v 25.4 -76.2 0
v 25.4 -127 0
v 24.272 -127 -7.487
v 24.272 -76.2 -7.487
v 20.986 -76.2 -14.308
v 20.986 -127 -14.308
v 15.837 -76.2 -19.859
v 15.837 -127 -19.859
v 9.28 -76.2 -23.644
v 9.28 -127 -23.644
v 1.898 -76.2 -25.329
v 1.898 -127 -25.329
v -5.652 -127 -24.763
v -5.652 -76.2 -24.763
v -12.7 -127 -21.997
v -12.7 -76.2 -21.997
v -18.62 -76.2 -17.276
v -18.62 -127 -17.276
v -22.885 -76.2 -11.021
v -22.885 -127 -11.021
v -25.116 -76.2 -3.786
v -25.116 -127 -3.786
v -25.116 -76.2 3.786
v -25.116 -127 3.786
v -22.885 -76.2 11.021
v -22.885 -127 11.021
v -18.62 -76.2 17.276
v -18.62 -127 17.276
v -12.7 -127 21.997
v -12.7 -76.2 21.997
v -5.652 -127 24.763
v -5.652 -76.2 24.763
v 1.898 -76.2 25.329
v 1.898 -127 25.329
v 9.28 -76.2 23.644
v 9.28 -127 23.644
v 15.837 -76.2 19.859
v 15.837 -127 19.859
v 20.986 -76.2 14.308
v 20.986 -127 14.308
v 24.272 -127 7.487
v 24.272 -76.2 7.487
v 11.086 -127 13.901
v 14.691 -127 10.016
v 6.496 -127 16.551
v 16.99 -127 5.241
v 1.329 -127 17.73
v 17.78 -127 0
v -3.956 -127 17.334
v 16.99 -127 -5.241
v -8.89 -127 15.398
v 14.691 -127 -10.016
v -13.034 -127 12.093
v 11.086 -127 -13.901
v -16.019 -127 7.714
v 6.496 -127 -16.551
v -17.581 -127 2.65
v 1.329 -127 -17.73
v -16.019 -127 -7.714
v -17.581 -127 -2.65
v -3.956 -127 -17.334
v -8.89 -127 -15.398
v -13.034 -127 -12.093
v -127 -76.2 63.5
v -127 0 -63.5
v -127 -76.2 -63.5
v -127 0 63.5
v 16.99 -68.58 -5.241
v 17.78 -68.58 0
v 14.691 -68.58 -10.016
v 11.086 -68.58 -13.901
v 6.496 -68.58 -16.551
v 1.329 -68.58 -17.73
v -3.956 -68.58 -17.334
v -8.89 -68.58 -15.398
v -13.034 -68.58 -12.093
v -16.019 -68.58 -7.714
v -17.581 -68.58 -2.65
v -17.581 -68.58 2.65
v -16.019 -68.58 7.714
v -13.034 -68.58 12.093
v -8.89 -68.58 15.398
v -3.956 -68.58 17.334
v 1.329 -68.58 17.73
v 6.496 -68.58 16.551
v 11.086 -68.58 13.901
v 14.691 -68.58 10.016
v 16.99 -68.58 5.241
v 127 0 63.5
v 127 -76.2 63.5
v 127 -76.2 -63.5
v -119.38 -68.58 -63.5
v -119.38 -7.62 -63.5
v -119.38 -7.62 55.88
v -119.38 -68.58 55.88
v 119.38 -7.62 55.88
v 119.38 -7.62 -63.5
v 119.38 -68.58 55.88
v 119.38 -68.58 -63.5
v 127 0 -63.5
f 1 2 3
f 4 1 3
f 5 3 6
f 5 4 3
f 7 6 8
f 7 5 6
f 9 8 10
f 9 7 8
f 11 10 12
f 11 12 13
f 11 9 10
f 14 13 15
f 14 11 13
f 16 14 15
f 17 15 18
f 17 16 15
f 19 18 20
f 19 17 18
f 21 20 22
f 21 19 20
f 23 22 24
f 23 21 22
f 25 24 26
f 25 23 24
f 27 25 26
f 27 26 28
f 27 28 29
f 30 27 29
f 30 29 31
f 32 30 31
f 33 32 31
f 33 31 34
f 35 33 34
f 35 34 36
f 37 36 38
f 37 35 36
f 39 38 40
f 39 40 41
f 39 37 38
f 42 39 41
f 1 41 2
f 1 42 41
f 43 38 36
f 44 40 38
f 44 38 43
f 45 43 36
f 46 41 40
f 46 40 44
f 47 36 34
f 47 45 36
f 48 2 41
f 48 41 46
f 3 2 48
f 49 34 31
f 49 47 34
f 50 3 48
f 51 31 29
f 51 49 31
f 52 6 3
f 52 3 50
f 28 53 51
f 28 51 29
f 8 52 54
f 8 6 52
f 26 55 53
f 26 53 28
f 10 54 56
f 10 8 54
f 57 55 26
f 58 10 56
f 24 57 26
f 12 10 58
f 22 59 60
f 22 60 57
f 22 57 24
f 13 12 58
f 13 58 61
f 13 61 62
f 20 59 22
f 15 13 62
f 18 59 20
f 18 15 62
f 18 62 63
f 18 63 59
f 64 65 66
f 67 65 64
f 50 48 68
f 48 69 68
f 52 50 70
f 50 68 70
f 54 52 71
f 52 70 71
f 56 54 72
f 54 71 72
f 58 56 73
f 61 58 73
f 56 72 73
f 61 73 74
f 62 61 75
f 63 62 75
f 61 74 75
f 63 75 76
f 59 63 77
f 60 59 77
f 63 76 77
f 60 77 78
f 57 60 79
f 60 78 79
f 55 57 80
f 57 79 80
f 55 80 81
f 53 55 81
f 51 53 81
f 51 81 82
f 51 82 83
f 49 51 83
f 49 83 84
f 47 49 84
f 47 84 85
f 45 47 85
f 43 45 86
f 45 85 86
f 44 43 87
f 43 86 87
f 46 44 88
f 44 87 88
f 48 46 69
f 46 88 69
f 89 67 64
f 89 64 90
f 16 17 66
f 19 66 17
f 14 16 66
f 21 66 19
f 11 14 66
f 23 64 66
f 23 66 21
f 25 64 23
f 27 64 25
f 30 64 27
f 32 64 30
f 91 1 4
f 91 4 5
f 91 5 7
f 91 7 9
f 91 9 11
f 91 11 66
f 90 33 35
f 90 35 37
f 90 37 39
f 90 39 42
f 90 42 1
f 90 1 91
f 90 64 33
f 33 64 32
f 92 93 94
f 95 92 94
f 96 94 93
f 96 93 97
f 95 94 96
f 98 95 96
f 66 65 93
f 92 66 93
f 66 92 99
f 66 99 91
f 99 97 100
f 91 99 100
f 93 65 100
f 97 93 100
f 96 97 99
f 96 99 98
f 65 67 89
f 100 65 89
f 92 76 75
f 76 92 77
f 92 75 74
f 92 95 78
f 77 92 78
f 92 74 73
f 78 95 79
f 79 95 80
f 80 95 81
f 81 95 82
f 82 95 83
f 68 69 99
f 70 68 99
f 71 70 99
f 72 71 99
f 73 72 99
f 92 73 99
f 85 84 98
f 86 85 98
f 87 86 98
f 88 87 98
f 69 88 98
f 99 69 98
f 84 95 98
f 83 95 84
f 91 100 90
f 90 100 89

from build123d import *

# Parameters (mm, degrees)
F0_W     = 254
F0_H     = 127
F1_DEPTH = 76.2
F2_W     = 25.4
F2_H     = 50.8
F4_T     = -7.62


with BuildPart() as f1:
    # F0 (on Front) → F1 (new body)
    with BuildSketch(Plane.XZ):
        Rectangle(F0_W, F0_H)
    extrude(amount=F1_DEPTH)

    # F2 (on Top) → F3 (revolve)
    with BuildSketch(Plane.XY):
        with Locations((12.7, -101.6)):
            Rectangle(F2_W, F2_H)
    revolve(axis=Axis((0, -101.6, 0), (0, 1, 0)))

    # F4
    f4_openings = [f1.faces().sort_by_distance(p)[0] for p in [
        (0, -127, 0),
        (0, -38.1, -63.5),
    ]]
    offset(amount=F4_T, openings=f4_openings, kind=Kind.INTERSECTION)


solid = f1.part
